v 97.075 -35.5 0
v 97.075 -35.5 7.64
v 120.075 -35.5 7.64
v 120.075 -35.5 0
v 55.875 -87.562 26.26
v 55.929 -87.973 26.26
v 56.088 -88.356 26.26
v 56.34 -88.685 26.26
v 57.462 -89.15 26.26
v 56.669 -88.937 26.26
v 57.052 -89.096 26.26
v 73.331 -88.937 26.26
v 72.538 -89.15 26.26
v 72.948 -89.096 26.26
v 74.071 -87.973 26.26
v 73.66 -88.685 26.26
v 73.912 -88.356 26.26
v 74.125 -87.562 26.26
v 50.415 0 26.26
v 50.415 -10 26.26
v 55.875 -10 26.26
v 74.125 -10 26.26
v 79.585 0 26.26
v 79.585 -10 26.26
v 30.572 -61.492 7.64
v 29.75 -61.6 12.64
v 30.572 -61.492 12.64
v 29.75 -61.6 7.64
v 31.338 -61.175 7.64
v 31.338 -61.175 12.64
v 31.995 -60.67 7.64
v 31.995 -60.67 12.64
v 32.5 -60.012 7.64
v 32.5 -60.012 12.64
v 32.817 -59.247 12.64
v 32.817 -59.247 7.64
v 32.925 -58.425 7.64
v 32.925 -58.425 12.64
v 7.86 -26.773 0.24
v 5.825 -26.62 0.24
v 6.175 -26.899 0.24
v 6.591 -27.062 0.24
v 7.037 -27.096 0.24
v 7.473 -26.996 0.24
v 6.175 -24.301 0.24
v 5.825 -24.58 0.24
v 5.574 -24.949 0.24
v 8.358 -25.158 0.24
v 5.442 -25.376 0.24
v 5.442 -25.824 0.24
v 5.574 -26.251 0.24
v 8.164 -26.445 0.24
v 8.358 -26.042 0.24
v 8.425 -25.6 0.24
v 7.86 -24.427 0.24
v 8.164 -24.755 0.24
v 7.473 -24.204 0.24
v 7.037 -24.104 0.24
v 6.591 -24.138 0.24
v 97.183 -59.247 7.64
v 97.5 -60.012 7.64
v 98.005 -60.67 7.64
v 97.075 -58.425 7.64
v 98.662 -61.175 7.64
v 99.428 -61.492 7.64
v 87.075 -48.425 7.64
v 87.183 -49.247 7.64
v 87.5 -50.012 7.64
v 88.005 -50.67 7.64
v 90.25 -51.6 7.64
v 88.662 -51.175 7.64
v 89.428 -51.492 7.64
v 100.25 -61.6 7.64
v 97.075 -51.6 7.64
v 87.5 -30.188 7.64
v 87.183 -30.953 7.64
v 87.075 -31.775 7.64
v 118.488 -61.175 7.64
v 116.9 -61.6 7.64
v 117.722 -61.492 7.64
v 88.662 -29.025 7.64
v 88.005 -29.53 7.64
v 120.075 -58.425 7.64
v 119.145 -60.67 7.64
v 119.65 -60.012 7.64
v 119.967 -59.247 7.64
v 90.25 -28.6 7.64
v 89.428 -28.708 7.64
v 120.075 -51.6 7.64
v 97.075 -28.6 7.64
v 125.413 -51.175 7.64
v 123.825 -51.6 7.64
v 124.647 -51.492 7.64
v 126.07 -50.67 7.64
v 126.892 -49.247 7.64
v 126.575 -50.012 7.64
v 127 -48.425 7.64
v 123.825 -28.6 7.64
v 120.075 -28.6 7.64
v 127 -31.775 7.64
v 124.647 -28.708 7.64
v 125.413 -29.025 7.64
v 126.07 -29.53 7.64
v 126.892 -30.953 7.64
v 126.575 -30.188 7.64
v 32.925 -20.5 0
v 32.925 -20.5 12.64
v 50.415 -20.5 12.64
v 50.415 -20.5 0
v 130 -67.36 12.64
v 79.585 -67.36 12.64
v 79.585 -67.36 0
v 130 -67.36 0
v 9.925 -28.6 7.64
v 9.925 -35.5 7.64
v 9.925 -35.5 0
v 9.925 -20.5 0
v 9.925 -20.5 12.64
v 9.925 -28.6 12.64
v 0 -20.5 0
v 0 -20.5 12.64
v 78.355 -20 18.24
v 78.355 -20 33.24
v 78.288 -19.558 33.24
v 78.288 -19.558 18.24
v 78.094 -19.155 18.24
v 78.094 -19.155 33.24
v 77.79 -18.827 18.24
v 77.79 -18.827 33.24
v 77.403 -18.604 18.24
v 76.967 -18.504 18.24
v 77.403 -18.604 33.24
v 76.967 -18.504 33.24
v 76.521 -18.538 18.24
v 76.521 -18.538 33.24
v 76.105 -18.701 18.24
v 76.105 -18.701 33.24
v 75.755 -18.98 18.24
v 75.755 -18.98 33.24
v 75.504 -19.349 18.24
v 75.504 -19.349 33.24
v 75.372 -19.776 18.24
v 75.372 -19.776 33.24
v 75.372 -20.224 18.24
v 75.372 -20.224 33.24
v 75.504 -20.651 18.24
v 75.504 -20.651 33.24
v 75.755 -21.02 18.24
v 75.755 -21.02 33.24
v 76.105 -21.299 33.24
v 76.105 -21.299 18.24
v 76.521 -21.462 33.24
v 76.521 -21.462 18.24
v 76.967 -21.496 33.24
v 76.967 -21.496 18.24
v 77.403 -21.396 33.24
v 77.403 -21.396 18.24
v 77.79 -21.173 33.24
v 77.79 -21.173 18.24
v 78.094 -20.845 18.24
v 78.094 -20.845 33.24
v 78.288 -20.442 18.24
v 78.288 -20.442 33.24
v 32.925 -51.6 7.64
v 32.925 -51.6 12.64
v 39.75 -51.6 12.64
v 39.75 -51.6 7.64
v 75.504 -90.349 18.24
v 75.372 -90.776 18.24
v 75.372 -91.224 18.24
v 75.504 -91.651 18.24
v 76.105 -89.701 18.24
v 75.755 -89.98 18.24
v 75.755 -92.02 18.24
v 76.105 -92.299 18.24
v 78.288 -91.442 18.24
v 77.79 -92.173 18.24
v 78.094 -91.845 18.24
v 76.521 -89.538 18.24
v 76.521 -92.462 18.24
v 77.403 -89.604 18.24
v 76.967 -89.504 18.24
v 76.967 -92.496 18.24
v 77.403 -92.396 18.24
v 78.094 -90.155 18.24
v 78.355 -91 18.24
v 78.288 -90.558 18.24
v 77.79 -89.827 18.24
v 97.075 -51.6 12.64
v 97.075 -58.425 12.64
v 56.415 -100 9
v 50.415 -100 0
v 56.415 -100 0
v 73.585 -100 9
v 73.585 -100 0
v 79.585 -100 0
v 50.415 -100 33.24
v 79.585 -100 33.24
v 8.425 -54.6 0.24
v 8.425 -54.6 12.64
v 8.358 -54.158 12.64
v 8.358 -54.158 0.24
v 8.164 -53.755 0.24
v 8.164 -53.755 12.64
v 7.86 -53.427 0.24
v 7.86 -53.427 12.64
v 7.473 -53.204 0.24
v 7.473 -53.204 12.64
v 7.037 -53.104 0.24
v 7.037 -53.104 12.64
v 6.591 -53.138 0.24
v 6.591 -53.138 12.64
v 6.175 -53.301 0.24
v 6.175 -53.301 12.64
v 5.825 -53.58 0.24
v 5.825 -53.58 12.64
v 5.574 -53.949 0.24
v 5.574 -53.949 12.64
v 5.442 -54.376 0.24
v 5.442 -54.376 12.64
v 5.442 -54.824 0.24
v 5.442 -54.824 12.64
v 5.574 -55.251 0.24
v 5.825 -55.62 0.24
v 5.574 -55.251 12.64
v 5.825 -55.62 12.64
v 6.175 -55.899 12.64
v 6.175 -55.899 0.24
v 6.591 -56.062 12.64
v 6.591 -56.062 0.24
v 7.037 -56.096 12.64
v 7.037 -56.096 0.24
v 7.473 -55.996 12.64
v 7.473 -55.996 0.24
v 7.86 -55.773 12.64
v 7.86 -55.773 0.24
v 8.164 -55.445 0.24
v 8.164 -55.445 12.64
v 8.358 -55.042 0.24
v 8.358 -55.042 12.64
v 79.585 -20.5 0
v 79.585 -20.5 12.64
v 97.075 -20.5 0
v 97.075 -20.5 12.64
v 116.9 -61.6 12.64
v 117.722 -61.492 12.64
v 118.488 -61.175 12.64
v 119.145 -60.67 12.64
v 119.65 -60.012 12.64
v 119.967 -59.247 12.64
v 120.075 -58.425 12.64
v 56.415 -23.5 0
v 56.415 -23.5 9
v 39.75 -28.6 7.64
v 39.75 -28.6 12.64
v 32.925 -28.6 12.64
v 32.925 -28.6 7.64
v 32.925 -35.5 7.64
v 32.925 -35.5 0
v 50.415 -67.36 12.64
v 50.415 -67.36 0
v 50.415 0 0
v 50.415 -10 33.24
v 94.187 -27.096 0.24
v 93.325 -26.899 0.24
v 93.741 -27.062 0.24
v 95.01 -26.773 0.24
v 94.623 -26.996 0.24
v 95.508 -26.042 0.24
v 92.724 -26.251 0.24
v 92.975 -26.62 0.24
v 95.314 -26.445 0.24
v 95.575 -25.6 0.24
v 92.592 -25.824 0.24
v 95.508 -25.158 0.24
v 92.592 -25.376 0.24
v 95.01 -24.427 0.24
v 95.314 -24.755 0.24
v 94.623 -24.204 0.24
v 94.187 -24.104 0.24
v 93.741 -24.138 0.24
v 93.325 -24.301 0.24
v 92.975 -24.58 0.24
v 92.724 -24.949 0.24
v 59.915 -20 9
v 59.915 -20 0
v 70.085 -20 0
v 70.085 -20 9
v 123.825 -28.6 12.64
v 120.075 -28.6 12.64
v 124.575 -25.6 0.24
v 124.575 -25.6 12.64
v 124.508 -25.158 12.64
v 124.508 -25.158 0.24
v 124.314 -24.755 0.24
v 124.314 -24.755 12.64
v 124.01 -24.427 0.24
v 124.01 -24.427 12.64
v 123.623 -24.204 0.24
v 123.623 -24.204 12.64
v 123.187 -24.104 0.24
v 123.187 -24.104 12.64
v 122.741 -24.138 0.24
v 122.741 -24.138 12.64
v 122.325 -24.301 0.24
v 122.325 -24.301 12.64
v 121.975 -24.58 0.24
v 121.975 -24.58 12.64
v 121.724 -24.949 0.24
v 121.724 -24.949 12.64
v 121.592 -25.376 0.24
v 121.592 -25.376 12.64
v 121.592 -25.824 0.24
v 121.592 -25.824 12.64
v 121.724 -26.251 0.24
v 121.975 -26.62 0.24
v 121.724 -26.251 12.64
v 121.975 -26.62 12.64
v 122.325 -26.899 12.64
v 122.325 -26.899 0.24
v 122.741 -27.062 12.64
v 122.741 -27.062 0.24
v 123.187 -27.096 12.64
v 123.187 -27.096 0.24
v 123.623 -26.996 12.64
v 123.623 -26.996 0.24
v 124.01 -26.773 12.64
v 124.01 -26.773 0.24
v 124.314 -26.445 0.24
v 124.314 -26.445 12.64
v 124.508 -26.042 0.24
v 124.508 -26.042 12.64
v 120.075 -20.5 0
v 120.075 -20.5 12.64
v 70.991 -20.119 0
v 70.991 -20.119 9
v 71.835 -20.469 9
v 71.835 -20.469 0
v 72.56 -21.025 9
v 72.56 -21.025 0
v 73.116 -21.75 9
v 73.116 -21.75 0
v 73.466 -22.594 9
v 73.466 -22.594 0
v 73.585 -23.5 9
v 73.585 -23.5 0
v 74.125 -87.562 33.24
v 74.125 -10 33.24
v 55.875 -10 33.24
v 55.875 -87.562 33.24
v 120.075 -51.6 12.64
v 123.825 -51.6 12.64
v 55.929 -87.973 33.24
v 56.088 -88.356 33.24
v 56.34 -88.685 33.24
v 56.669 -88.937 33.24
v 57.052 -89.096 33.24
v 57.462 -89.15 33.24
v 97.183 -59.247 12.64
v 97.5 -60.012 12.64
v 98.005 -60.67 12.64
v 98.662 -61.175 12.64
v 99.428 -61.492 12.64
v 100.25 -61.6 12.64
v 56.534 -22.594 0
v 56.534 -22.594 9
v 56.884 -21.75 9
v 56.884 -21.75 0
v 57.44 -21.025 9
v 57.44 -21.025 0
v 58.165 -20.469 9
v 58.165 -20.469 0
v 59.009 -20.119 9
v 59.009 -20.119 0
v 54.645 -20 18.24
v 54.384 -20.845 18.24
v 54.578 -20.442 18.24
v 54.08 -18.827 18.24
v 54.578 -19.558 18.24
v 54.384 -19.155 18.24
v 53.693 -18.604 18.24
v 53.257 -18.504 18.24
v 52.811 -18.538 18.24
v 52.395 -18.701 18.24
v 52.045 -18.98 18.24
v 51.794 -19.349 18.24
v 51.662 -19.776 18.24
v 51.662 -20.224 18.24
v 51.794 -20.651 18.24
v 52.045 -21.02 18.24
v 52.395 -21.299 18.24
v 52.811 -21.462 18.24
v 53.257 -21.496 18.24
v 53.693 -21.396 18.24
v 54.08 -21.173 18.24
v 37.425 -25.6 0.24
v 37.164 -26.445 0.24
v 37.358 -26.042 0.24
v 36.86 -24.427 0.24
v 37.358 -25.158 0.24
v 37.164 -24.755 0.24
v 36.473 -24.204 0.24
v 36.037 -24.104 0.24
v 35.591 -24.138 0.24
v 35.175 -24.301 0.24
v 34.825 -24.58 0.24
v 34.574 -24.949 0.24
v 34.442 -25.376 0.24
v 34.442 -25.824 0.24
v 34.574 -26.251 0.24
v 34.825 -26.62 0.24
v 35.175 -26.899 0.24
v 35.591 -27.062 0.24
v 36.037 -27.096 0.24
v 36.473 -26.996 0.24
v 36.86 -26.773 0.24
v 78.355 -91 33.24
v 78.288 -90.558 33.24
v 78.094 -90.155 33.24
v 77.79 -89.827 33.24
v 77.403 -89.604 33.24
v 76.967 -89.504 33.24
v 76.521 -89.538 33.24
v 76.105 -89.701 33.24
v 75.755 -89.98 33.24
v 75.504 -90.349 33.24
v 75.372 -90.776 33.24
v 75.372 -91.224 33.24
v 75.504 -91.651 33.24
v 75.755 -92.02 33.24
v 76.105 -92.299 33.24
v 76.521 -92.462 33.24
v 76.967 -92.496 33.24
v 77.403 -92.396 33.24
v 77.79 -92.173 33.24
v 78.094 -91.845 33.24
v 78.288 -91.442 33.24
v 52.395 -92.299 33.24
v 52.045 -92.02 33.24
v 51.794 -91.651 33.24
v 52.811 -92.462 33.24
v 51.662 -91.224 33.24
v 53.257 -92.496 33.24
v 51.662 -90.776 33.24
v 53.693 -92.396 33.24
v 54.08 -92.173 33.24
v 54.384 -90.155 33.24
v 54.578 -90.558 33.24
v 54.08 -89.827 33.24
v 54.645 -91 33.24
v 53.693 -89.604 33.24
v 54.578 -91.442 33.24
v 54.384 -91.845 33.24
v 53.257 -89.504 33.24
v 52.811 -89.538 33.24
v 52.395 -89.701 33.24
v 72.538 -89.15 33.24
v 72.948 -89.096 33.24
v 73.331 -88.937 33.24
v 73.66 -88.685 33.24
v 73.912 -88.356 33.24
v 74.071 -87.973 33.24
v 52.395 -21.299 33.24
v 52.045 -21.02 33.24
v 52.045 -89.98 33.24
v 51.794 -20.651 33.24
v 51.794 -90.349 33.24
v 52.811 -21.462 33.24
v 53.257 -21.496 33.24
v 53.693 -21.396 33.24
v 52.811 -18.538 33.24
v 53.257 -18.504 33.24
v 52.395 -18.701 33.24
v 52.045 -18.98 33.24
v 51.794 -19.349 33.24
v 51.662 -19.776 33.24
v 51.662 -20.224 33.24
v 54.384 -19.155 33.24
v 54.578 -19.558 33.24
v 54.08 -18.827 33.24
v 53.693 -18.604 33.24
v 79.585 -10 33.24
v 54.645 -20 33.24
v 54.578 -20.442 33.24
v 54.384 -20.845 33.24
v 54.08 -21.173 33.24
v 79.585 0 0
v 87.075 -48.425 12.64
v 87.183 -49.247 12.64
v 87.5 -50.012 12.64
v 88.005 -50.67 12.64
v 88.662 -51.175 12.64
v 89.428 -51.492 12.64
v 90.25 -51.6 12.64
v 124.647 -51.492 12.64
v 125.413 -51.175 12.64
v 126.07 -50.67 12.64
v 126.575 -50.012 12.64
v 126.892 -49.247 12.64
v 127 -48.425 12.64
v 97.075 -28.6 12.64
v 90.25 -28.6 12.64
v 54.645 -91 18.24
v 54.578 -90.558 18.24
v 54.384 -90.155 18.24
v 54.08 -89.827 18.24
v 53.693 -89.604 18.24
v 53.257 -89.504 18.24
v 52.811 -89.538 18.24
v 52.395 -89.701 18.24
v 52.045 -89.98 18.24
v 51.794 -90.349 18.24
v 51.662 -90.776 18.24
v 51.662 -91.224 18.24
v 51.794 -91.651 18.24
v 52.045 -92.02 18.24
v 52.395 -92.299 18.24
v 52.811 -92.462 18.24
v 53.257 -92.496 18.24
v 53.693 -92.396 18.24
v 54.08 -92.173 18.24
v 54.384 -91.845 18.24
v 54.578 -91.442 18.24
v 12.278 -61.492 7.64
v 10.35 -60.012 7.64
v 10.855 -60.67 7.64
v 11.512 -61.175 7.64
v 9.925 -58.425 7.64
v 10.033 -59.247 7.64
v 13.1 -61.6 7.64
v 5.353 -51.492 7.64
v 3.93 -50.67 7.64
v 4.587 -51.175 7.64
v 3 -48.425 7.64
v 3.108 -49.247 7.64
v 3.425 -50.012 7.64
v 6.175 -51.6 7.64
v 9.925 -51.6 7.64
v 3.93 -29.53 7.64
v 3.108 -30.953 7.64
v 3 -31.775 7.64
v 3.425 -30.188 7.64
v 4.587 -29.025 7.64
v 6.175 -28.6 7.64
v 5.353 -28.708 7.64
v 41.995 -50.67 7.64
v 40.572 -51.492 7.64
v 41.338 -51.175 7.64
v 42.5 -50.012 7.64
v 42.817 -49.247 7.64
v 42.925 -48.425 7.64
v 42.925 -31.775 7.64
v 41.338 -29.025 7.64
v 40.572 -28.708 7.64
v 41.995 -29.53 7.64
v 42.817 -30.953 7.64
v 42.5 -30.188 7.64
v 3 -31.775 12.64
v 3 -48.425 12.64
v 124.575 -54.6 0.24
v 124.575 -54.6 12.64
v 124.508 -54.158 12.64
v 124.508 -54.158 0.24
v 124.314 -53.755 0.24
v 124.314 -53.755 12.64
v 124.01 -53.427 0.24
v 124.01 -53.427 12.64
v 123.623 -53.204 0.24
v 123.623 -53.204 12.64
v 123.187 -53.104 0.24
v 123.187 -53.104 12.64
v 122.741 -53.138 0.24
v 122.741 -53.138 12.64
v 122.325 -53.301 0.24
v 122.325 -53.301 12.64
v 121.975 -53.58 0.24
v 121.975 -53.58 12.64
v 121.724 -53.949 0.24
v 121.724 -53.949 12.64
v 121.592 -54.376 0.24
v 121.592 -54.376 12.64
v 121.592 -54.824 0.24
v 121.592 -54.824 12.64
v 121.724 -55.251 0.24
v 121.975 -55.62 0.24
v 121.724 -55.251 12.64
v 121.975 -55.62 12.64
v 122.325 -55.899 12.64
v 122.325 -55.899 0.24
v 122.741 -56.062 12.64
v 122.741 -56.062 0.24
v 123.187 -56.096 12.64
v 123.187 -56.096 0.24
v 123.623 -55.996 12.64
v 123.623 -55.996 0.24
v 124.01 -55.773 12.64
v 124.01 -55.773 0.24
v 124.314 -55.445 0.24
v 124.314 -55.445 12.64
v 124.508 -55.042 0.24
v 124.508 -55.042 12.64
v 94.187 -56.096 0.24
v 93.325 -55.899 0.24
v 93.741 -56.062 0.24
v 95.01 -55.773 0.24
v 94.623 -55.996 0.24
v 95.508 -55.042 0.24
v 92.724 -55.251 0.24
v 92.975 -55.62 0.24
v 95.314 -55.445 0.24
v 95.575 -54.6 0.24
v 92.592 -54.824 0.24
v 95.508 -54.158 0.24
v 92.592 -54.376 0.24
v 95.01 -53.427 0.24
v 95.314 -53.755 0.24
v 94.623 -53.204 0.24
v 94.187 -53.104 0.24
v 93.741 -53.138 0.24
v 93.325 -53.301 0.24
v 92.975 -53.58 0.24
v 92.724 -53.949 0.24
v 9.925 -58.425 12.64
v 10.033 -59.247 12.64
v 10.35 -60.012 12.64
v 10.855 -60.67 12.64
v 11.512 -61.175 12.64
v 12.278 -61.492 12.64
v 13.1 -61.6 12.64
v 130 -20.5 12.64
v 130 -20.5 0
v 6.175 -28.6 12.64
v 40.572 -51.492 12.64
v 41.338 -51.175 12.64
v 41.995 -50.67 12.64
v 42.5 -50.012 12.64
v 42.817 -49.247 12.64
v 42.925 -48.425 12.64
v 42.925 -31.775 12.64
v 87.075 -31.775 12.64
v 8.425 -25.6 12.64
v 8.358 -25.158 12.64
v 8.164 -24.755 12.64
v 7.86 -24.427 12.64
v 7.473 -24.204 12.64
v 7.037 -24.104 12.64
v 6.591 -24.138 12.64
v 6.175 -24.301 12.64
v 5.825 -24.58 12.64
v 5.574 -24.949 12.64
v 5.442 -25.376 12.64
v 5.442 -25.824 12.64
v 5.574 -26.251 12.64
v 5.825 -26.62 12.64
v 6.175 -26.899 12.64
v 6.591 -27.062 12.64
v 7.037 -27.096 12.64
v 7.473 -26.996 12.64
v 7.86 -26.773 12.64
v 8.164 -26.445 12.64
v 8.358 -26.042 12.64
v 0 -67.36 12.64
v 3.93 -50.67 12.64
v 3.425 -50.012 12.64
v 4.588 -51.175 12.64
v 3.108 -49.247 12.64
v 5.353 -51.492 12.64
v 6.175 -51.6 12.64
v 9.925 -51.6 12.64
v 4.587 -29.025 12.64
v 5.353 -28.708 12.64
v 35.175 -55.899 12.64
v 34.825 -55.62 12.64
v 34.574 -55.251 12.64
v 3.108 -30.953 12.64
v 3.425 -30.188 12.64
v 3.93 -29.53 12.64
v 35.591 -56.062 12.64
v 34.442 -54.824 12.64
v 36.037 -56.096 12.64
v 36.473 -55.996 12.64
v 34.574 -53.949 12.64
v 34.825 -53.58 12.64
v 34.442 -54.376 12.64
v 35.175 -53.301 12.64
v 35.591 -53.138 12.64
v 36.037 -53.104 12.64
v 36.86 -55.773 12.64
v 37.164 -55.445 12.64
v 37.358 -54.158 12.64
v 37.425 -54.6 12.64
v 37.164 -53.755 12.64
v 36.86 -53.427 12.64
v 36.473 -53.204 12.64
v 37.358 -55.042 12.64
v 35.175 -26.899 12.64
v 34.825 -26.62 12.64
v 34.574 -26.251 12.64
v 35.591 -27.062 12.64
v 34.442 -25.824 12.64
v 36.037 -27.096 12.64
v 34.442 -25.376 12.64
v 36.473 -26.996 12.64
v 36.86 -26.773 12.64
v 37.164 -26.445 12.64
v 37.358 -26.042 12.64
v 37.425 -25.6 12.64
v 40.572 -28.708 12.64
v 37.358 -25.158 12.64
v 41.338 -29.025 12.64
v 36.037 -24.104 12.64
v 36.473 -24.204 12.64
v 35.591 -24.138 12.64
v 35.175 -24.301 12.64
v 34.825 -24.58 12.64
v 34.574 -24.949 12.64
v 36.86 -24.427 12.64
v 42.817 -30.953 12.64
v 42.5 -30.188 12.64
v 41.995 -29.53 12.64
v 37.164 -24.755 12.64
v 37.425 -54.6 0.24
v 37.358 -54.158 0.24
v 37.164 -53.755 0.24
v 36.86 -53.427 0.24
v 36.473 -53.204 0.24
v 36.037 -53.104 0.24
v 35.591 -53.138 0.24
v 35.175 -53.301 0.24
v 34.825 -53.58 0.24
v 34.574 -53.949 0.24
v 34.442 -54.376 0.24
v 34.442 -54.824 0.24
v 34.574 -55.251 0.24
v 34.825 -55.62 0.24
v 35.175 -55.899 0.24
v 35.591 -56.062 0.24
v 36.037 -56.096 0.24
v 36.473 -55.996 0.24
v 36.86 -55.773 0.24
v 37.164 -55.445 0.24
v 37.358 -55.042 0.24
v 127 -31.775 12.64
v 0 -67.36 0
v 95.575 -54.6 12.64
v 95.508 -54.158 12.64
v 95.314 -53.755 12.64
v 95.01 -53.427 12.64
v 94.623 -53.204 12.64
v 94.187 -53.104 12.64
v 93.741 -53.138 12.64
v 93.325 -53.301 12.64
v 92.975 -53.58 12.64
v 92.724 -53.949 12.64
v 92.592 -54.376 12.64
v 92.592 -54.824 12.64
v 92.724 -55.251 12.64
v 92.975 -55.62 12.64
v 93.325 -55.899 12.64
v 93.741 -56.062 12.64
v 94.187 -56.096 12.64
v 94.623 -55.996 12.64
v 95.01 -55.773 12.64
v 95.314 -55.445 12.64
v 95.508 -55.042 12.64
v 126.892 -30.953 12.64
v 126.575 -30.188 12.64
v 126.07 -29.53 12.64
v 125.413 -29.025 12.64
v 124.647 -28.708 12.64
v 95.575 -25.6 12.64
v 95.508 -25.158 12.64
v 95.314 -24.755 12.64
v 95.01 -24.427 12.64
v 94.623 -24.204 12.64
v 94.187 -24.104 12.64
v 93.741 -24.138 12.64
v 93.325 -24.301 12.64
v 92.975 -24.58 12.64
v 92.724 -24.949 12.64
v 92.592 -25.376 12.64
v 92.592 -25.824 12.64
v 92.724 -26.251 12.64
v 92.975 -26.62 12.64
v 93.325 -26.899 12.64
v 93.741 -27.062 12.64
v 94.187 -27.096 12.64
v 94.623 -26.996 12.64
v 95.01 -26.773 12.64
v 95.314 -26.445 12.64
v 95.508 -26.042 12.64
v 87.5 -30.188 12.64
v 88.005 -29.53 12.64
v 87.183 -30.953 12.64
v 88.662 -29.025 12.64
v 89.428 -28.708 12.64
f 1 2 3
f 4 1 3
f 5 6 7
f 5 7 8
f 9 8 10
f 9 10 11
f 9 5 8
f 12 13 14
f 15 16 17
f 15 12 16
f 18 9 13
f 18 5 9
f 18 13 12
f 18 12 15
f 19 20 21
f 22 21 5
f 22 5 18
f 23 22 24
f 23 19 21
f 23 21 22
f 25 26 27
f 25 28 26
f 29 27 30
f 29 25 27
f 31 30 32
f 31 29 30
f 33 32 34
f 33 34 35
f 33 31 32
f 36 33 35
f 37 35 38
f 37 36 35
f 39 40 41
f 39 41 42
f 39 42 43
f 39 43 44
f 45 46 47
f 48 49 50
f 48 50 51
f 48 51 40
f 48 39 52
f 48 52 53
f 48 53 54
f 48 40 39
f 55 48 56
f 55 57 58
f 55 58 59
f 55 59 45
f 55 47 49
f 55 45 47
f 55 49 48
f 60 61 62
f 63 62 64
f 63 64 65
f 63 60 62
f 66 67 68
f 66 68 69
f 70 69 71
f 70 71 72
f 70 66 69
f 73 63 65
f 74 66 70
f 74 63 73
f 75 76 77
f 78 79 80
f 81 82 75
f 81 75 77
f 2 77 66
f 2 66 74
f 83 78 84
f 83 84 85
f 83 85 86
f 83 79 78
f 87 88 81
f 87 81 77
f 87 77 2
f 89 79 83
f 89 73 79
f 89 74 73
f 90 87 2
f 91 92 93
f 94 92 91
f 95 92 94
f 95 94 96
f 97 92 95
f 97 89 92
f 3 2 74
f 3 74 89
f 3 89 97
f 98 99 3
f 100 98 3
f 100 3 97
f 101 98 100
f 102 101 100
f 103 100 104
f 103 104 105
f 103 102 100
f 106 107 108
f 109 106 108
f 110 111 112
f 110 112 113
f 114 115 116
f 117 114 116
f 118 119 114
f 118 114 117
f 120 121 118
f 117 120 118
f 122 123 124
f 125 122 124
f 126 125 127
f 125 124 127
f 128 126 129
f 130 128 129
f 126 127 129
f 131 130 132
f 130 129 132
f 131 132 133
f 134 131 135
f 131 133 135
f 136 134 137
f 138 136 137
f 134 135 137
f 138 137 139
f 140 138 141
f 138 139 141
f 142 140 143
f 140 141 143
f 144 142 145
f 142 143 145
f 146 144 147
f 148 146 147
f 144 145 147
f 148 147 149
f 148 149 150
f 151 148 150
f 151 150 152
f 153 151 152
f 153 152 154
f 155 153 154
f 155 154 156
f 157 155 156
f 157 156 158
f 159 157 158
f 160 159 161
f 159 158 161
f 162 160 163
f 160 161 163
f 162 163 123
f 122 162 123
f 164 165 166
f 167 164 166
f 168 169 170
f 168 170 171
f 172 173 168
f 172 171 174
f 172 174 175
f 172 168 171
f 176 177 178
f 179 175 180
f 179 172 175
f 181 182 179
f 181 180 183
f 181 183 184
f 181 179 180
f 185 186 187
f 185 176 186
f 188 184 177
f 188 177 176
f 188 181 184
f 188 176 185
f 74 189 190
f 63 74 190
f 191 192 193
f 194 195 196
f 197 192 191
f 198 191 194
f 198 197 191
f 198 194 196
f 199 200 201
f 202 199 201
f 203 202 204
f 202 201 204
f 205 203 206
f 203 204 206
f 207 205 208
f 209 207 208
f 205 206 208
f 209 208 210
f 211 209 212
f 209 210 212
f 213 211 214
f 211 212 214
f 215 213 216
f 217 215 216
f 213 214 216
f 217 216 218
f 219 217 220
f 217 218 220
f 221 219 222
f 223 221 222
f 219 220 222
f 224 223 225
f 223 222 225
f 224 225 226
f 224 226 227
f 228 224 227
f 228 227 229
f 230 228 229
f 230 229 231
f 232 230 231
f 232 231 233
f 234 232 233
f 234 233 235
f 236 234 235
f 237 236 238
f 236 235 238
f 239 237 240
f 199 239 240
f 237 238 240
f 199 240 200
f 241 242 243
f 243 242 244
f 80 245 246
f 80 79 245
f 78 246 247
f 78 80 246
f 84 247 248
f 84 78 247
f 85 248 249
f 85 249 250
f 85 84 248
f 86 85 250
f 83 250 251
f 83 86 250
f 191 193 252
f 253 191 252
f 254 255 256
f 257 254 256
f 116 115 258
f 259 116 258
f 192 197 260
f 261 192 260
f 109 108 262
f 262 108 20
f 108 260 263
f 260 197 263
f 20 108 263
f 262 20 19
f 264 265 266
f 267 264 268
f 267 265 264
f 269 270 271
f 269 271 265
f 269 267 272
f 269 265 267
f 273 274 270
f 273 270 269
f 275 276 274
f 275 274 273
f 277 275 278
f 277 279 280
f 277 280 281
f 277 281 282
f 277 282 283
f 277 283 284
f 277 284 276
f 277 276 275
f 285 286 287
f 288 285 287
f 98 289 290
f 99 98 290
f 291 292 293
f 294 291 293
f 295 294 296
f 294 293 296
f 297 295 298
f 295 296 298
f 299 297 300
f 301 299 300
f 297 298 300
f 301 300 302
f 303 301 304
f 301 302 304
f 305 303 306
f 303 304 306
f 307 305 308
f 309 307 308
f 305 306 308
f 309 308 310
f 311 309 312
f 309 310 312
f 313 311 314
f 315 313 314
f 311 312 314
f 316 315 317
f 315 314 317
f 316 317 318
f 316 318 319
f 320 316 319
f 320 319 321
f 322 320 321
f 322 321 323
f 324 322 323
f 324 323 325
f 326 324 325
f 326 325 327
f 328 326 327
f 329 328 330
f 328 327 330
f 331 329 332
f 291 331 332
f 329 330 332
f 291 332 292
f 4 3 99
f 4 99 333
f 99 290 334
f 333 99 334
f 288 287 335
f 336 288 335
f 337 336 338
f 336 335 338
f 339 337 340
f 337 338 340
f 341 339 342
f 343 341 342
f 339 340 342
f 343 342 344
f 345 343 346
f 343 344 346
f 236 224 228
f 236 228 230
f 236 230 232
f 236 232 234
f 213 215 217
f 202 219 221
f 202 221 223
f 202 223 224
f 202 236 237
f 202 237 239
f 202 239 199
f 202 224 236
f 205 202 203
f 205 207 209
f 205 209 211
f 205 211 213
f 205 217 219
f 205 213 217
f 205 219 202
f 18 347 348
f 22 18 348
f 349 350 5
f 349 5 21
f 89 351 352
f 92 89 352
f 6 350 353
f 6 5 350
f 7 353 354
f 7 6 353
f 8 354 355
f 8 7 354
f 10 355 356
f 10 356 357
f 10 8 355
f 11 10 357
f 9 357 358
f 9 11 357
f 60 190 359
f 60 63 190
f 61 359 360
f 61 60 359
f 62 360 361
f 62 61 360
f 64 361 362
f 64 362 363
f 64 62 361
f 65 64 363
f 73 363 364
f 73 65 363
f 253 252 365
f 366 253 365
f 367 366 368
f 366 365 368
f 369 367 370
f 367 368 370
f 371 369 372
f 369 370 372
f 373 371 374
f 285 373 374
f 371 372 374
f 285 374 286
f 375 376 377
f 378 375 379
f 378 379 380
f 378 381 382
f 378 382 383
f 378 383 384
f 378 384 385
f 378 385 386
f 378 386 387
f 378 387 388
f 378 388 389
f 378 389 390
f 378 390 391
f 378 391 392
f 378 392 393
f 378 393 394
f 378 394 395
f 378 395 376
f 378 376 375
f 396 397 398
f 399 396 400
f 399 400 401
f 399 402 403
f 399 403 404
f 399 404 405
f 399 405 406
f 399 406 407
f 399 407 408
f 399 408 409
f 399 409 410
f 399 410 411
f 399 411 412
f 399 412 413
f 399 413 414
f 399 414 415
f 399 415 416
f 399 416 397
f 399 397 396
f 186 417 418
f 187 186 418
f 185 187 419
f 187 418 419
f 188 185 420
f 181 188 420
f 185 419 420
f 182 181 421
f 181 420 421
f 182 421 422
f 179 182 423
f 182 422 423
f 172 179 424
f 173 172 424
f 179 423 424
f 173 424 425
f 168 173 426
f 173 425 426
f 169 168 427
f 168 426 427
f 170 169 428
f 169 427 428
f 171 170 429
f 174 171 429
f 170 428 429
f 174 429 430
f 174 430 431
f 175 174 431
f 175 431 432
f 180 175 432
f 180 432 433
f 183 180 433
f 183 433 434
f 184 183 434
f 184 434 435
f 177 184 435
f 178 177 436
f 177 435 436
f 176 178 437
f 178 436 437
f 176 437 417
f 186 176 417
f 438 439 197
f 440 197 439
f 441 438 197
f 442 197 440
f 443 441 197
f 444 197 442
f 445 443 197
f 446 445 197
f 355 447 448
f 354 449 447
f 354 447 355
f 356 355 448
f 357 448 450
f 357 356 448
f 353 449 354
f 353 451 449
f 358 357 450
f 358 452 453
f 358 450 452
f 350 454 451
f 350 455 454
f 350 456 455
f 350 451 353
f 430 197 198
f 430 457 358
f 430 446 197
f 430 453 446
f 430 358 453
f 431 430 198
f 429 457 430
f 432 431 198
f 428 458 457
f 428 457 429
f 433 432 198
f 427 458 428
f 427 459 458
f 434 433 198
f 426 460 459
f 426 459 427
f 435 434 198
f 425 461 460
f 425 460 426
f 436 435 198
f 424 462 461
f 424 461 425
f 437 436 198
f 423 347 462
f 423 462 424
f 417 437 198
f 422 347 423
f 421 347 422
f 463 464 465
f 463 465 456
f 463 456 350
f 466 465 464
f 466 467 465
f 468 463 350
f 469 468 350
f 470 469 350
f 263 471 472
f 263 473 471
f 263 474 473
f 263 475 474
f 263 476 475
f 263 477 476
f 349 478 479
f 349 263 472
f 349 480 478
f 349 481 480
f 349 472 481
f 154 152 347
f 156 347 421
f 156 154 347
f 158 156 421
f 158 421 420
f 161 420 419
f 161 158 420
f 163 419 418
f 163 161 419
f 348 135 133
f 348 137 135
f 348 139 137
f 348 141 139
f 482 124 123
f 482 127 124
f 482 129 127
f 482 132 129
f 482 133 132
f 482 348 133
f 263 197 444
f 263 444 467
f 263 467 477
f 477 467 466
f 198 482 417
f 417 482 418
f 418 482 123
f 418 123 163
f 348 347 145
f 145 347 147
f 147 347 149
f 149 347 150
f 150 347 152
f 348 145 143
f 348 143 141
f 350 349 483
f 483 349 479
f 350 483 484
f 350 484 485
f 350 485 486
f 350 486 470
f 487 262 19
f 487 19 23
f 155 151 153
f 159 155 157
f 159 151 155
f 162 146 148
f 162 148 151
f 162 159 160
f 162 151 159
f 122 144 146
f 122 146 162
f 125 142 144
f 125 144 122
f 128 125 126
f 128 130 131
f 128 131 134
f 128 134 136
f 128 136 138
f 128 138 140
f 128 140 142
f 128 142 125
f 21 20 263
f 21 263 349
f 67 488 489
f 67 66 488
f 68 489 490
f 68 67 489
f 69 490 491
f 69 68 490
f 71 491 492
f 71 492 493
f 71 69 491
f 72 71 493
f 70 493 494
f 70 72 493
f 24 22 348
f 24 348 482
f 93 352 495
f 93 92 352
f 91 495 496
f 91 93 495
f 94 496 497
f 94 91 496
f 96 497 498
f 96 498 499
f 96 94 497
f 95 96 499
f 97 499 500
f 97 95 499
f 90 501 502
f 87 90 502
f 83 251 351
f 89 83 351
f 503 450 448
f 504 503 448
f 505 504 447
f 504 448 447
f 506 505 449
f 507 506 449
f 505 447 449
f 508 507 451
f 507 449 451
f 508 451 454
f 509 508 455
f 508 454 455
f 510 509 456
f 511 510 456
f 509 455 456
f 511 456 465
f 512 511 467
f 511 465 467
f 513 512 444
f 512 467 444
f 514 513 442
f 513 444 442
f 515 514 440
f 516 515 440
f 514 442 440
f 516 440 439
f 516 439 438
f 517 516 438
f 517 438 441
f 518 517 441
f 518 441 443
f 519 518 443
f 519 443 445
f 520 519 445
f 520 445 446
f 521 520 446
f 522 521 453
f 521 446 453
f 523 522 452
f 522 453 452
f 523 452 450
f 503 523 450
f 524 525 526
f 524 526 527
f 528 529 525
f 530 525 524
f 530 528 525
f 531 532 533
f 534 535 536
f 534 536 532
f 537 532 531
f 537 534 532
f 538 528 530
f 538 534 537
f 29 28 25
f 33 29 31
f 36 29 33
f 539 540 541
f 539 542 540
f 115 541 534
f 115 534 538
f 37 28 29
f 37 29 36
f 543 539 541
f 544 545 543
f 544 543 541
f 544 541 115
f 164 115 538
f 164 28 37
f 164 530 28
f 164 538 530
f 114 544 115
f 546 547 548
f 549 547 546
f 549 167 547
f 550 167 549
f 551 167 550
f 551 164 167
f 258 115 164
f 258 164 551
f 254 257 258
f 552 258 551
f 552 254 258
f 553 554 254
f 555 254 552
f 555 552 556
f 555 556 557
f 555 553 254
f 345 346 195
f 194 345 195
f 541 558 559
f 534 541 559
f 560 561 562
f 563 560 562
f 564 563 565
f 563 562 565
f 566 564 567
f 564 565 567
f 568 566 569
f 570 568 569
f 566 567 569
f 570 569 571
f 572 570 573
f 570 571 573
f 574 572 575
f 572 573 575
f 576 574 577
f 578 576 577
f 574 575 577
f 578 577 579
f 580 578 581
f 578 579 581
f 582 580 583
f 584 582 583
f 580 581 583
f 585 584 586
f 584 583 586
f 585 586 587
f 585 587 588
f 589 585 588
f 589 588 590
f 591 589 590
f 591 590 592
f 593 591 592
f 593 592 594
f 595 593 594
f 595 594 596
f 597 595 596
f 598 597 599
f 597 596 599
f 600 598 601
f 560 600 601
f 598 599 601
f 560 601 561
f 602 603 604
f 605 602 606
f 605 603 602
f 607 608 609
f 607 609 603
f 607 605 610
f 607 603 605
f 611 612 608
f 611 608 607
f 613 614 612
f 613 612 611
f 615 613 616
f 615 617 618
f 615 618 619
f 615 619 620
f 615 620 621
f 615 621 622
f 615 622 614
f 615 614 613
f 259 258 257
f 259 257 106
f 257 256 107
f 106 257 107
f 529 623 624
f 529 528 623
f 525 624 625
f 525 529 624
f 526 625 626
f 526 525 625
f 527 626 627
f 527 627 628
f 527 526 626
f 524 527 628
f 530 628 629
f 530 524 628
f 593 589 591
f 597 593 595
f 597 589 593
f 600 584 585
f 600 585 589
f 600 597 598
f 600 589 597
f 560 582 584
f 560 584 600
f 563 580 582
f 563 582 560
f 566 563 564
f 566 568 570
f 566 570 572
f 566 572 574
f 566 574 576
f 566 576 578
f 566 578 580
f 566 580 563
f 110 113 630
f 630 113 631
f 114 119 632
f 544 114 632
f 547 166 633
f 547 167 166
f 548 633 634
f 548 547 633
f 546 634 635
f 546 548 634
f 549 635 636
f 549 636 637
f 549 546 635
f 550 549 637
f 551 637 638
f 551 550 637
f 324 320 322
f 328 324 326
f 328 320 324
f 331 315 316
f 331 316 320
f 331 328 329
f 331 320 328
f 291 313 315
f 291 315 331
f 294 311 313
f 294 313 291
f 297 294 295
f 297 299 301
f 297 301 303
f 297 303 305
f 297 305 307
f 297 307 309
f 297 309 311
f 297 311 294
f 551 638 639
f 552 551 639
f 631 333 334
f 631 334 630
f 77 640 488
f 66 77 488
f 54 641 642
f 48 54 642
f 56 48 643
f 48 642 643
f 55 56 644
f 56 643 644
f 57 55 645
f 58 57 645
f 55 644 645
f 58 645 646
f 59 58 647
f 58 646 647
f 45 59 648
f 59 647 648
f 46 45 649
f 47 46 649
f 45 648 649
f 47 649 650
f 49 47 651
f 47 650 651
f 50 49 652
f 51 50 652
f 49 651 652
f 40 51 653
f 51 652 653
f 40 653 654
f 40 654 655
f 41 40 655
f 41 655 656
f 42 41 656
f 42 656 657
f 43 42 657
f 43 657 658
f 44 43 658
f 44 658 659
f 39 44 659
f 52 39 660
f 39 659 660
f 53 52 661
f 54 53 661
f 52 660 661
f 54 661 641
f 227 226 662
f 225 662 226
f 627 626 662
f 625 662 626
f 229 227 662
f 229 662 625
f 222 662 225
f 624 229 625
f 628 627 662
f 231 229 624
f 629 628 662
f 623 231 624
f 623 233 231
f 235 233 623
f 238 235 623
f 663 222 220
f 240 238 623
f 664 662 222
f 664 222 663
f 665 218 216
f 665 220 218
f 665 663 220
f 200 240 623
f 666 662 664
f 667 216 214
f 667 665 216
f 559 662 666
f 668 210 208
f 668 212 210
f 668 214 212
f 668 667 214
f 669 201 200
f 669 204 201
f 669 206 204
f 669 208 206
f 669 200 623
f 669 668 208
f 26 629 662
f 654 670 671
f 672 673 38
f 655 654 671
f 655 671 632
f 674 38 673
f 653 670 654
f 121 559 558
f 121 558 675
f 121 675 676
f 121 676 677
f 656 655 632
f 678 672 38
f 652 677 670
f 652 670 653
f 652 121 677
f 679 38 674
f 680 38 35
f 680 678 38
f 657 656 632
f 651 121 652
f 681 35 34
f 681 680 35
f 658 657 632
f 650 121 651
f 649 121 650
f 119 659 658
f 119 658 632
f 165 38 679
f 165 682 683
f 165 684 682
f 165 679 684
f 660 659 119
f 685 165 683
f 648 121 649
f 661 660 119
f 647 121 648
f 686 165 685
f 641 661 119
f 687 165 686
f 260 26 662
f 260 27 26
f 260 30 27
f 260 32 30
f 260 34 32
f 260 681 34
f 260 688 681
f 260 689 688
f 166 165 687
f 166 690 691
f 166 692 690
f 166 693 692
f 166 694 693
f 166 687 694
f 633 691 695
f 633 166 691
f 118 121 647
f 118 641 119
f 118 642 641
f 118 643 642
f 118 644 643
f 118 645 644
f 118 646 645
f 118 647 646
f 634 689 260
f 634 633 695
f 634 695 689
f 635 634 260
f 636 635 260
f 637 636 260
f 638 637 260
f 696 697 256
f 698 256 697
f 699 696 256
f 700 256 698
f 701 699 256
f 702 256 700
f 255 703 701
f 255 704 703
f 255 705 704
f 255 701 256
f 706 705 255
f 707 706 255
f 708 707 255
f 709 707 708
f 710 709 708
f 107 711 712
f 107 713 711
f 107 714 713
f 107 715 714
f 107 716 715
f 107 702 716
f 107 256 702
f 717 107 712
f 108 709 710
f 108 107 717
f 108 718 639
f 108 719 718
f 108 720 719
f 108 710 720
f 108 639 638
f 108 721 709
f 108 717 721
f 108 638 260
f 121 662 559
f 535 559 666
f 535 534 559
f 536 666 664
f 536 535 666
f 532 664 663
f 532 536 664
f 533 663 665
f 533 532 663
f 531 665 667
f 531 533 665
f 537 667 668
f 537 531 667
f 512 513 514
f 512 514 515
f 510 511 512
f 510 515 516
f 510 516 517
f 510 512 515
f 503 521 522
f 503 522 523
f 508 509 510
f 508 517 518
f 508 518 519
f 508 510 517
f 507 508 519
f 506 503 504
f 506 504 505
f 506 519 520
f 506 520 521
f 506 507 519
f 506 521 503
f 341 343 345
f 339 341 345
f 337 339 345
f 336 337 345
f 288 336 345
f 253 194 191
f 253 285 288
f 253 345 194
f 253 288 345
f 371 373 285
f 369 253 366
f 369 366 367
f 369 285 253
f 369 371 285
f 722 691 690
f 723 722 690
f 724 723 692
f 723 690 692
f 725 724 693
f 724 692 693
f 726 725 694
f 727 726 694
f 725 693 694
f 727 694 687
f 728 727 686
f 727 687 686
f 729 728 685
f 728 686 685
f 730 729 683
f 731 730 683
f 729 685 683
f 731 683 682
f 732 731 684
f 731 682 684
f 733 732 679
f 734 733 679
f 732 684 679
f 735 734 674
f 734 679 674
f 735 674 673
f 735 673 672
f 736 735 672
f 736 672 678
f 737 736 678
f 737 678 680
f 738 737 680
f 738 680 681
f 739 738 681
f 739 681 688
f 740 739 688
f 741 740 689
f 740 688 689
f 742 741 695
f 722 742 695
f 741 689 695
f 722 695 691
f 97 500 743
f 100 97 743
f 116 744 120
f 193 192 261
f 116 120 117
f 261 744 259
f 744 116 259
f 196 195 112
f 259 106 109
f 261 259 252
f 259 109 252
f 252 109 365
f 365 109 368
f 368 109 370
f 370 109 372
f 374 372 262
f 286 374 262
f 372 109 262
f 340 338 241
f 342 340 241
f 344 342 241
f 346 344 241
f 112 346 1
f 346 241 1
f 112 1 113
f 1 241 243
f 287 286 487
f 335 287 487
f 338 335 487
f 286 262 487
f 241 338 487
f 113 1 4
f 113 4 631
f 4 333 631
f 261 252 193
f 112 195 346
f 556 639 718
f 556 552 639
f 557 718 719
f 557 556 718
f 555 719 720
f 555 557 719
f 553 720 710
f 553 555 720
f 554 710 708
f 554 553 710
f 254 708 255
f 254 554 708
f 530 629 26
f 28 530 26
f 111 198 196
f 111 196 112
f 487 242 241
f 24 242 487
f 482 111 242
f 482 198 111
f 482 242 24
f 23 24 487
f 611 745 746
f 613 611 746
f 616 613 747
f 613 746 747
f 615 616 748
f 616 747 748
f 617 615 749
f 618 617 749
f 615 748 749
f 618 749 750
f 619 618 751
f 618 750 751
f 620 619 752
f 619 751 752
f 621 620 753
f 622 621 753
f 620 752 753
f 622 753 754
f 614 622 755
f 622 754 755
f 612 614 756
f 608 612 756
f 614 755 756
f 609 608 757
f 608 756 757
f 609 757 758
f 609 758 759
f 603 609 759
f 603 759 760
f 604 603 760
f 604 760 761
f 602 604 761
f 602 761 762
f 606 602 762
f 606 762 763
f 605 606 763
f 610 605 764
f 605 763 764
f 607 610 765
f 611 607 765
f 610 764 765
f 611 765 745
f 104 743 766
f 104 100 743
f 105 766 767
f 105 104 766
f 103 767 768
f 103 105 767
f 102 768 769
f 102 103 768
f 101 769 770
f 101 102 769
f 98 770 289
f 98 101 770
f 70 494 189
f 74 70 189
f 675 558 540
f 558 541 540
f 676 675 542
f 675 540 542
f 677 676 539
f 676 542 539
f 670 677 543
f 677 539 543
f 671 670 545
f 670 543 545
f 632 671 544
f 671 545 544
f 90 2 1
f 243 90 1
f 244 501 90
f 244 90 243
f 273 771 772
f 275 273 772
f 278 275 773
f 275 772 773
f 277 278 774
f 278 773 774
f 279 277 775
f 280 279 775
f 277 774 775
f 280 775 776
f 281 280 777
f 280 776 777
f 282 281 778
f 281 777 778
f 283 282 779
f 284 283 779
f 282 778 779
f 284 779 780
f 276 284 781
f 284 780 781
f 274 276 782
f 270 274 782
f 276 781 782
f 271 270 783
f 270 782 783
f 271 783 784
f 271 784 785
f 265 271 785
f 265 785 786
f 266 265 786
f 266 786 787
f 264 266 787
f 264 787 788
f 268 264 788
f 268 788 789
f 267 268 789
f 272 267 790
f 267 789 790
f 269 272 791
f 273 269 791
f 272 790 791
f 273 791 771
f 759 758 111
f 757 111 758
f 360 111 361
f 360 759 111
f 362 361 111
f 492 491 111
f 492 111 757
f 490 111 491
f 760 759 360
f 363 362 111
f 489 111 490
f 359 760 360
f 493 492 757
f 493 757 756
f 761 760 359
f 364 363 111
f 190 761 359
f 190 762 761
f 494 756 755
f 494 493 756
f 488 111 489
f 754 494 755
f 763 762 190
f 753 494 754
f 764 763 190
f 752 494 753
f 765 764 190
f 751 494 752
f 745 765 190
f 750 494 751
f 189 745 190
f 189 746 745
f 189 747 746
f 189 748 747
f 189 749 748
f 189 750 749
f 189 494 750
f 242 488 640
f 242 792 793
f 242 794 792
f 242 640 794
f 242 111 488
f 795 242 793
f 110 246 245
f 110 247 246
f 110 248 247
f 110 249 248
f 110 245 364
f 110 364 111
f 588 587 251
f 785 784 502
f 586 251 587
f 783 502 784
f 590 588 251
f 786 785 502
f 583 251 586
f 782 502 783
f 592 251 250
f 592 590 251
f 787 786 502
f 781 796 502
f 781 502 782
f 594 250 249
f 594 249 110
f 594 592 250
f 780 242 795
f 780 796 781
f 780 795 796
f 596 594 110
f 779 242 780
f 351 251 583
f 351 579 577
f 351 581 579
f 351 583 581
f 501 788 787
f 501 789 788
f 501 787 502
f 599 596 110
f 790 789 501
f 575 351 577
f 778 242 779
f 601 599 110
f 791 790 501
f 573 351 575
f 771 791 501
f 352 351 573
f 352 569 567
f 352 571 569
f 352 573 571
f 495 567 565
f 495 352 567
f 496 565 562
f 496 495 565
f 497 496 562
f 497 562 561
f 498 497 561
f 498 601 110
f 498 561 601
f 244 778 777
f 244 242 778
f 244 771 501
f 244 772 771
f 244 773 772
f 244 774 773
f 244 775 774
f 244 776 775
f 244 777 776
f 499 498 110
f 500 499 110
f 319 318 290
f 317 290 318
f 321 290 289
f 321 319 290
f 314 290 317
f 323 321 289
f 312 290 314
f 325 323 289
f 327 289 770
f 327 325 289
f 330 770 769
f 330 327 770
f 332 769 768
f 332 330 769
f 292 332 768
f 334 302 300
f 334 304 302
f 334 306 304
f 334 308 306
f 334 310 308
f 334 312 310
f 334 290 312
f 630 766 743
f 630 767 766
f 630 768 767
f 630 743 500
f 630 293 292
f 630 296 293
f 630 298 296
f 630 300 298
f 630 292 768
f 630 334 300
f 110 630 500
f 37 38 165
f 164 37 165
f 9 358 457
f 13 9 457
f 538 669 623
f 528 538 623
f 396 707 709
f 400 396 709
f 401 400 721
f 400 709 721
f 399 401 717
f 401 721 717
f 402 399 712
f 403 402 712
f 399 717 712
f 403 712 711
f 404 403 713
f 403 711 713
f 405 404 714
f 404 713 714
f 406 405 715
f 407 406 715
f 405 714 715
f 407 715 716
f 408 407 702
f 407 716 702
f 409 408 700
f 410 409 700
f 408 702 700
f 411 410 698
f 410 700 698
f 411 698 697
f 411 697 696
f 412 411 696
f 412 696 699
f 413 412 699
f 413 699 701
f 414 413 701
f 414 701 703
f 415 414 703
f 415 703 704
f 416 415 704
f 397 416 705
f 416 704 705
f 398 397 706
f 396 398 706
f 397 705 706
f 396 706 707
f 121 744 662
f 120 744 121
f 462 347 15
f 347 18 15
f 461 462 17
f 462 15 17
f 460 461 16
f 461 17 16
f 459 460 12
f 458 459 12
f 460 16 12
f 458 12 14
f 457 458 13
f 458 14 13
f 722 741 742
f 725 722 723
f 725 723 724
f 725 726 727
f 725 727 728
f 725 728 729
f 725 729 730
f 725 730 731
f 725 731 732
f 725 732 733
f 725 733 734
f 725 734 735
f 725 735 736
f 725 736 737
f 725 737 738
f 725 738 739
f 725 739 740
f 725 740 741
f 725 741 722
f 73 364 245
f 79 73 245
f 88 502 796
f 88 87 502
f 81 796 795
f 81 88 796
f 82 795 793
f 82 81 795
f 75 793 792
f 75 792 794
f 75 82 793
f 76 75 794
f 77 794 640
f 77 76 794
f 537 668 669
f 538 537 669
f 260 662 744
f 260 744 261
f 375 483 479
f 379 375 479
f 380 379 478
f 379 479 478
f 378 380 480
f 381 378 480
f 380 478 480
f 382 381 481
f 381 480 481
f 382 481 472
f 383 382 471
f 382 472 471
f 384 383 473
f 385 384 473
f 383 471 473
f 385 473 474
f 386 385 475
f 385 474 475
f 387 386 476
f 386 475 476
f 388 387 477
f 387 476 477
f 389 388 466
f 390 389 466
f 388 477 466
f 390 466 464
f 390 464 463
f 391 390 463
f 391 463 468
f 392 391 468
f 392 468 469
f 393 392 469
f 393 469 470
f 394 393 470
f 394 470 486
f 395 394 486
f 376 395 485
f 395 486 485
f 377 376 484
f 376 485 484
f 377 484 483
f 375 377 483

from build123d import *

# Parameters (mm, degrees)
SKETCH1_W           = 130
SKETCH1_H           = 104.86
BOSS_EXTRUDE1_DEPTH = 39.84
SKETCH2_W           = 130
SKETCH2_H           = 94.86
CUT_EXTRUDE1_DEPTH  = 6.6
SKETCH3_W           = 18.25
SKETCH3_H           = 89.15
CUT_EXTRUDE2_DEPTH  = 6.98
SKETCH5_W           = 50.415
SKETCH5_H           = 94.86
CUT_EXTRUDE3_DEPTH  = 20.6
SKETCH6_R           = 1.5
CUT_EXTRUDE4_DEPTH  = 12.4
SKETCH7_W           = 50.415
SKETCH7_H           = 20.5
CUT_EXTRUDE5_DEPTH  = 12.4
SKETCH9_W           = 23
SKETCH9_H           = 15
CUT_EXTRUDE7_DEPTH  = 12.4
CUT_EXTRUDE8_DEPTH  = 5
SKETCH11_R          = 1.5
CUT_EXTRUDE9_DEPTH  = 15
FILLET2_R           = 3.175
FILLET3_R           = 3.175
FILLET4_R           = 3.175
FILLET5_R           = 1.5875
FILLET6_R           = 3.175
SKETCH12_W          = 50.415
SKETCH12_H          = 20.5
SKETCH12_W_2        = 23
SKETCH12_H_2        = 15
SKETCH12_H_3        = 27.5
SKETCH12_W_3        = 29.17
SKETCH12_H_4        = 4.86
CUT_EXTRUDE11_DEPTH = 42
SKETCH13_W          = 6.6
SKETCH13_H          = 5.14
CUT_EXTRUDE12_DEPTH = 80.585
SKETCH14_W          = 29.17
SKETCH14_H          = 10
CUT_EXTRUDE14_DEPTH = 6.98
CUT_EXTRUDE15_DEPTH = 9


with BuildPart() as part:
    # Sketch1 → Boss-Extrude1 (new body)
    with BuildSketch(Plane.XY):
        with Locations((65, -52.43)):
            Rectangle(SKETCH1_W, SKETCH1_H)
    extrude(amount=BOSS_EXTRUDE1_DEPTH)

    # Sketch2 → Cut-Extrude1 (cut)
    with BuildSketch(Plane.XY.offset(39.84)):
        with Locations((65, -47.43)):
            Rectangle(SKETCH2_W, SKETCH2_H)
    extrude(amount=-CUT_EXTRUDE1_DEPTH, mode=Mode.SUBTRACT)

    # Sketch3 → Cut-Extrude2 (cut)
    with BuildSketch(Plane.XY.offset(33.24)):
        with Locations((65, -44.575)):
            Rectangle(SKETCH3_W, SKETCH3_H)
    extrude(amount=-CUT_EXTRUDE2_DEPTH, mode=Mode.SUBTRACT)

    # Sketch5 → Cut-Extrude3 (cut)
    with BuildSketch(Plane.XY.offset(33.24)):
        with Locations((104.7925, -47.43)):
            Rectangle(SKETCH5_W, SKETCH5_H)
        with Locations((25.2075, -47.43)):
            Rectangle(SKETCH5_W, SKETCH5_H)
    extrude(amount=-CUT_EXTRUDE3_DEPTH, mode=Mode.SUBTRACT)

    # Sketch6 → Cut-Extrude4 (cut)
    with BuildSketch(Plane.XY.offset(12.64)):
        with Locations((35.925, -25.6)):
            Circle(SKETCH6_R)
        with Locations((6.925, -25.6)):
            Circle(SKETCH6_R)
        with Locations((35.925, -54.6)):
            Circle(SKETCH6_R)
        with Locations((6.925, -54.6)):
            Circle(SKETCH6_R)
        with Locations((94.075, -25.6)):
            Circle(SKETCH6_R)
        with Locations((123.075, -25.6)):
            Circle(SKETCH6_R)
        with Locations((94.075, -54.6)):
            Circle(SKETCH6_R)
        with Locations((123.075, -54.6)):
            Circle(SKETCH6_R)
    extrude(amount=-CUT_EXTRUDE4_DEPTH, mode=Mode.SUBTRACT)

    # Sketch7 → Cut-Extrude5 (cut)
    with BuildSketch(Plane.XY.offset(12.64)):
        with Locations((25.2075, -10.25)):
            Rectangle(SKETCH7_W, SKETCH7_H)
        with Locations((104.7925, -10.25)):
            Rectangle(SKETCH7_W, SKETCH7_H)
    extrude(amount=-CUT_EXTRUDE5_DEPTH, mode=Mode.SUBTRACT)

    # Sketch9 → Cut-Extrude7 (cut)
    with BuildSketch(Plane.XY.offset(12.64)):
        with Locations((108.575, -28)):
            Rectangle(SKETCH9_W, SKETCH9_H)
        with Locations((21.425, -28)):
            Rectangle(SKETCH9_W, SKETCH9_H)
    extrude(amount=-CUT_EXTRUDE7_DEPTH, mode=Mode.SUBTRACT)

    # Sketch10 → Cut-Extrude8 (cut)
    with BuildSketch(Plane.XY.offset(12.64)):
        Polygon((9.925, -28.6), (3, -28.6), (3, -51.6), (9.925, -51.6), (9.925, -61.6), (32.925, -61.6), (32.925, -51.6), (42.925, -51.6), (42.925, -28.6), (32.925, -28.6), (32.925, -35.5), (9.925, -35.5), align=None)
        Polygon((97.075, -28.6), (87.075, -28.6), (87.075, -51.6), (97.075, -51.6), (97.075, -61.6), (120.075, -61.6), (120.075, -51.6), (127, -51.6), (127, -28.6), (120.075, -28.6), (120.075, -35.5), (97.075, -35.5), align=None)
    extrude(amount=-CUT_EXTRUDE8_DEPTH, mode=Mode.SUBTRACT)

    # Sketch11 → Cut-Extrude9 (cut)
    with BuildSketch(Plane.XY.offset(33.24)):
        with Locations((53.145, -20)):
            Circle(SKETCH11_R)
        with Locations((76.855, -20)):
            Circle(SKETCH11_R)
        with Locations((53.145, -91)):
            Circle(SKETCH11_R)
        with Locations((76.855, -91)):
            Circle(SKETCH11_R)
    extrude(amount=-CUT_EXTRUDE9_DEPTH, mode=Mode.SUBTRACT)

    # Fillet2
    fillet2_edges = [part.edges().sort_by_distance(p)[0] for p in [
        (3, -51.6, 10.14),
    ]]
    fillet(fillet2_edges, radius=FILLET2_R)

    # Fillet3
    fillet3_edges = [part.edges().sort_by_distance(p)[0] for p in [
        (50.415, -20.5, 6.44),
        (79.585, -20.5, 6.44),
        (32.925, -35.5, 3.94),
        (9.925, -35.5, 3.94),
        (42.925, -28.6, 10.14),
        (42.925, -51.6, 10.14),
        (32.925, -61.6, 10.14),
        (9.925, -61.6, 10.14),
        (3, -28.6, 10.14),
        (127, -28.6, 10.14),
        (127, -51.6, 10.14),
        (120.075, -61.6, 10.14),
        (97.075, -61.6, 10.14),
        (87.075, -51.6, 10.14),
        (87.075, -28.6, 10.14),
    ]]
    fillet(fillet3_edges, radius=FILLET3_R)

    # Fillet4
    fillet4_edges = [part.edges().sort_by_distance(p)[0] for p in [
        (120.075, -35.5, 3.94),
        (97.075, -35.5, 3.94),
    ]]
    fillet(fillet4_edges, radius=FILLET4_R)

    # Fillet5
    fillet5_edges = [part.edges().sort_by_distance(p)[0] for p in [
        (74.125, -89.15, 29.75),
        (55.875, -89.15, 29.75),
    ]]
    fillet(fillet5_edges, radius=FILLET5_R)

    # Fillet6
    fillet6_edges = [part.edges().sort_by_distance(p)[0] for p in [
        (79.585, -94.86, 22.94),
        (50.415, -94.86, 22.94),
    ]]
    fillet(fillet6_edges, radius=FILLET6_R)

    # Sketch12 → Cut-Extrude11 (cut)
    with BuildSketch(Plane.XY.offset(39.84)):
        with Locations((25.2075, -10.25)):
            Rectangle(SKETCH12_W, SKETCH12_H)
        with Locations((104.7925, -10.25)):
            Rectangle(SKETCH12_W, SKETCH12_H)
        with Locations((108.575, -28)):
            Rectangle(SKETCH12_W_2, SKETCH12_H_2)
        with Locations((21.425, -28)):
            Rectangle(SKETCH12_W_2, SKETCH12_H_2)
        with Locations((25.2075, -81.11)):
            Rectangle(SKETCH12_W, SKETCH12_H_3)
        with Locations((104.7925, -81.11)):
            Rectangle(SKETCH12_W, SKETCH12_H_3)
        Polygon((130, -94.86), (79.585, -94.86), (79.585, -100), (79.585, -104.86), (130, -104.86), align=None)
        Polygon((50.415, -94.86), (0, -94.86), (0, -104.86), (50.415, -104.86), (50.415, -100), (50.415, -95.14), align=None)
        with Locations((65, -102.43)):
            Rectangle(SKETCH12_W_3, SKETCH12_H_4)
    extrude(amount=-CUT_EXTRUDE11_DEPTH, mode=Mode.SUBTRACT)

    # Sketch13 → Cut-Extrude12 (cut, through all)
    with BuildSketch(Plane(origin=(79.585, 0, 0), x_dir=(0, 0, -1), z_dir=(1, 0, 0))):
        with Locations((-36.54, -97.43)):
            Rectangle(SKETCH13_W, SKETCH13_H)
    extrude(amount=-CUT_EXTRUDE12_DEPTH, mode=Mode.SUBTRACT)

    # Sketch14 → Cut-Extrude14 (cut)
    with BuildSketch(Plane.XY.offset(33.24)):
        with Locations((65, -5)):
            Rectangle(SKETCH14_W, SKETCH14_H)
    extrude(amount=-CUT_EXTRUDE14_DEPTH, mode=Mode.SUBTRACT)

    # Sketch15 → Cut-Extrude15 (cut)
    with BuildSketch(Plane(origin=(0, 0, 0), x_dir=(-1, 0, 0), z_dir=(0, 0, -1))):
        with BuildLine():
            Line((-73.585, -100), (-56.415, -100))
            Line((-56.415, -100), (-56.415, -23.5))
            ThreePointArc((-56.415, -23.5), (-57.440126266, -21.025126266), (-59.915, -20))
            Line((-59.915, -20), (-70.085, -20))
            ThreePointArc((-70.085, -20), (-72.559873734, -21.025126266), (-73.585, -23.5))
            Line((-73.585, -23.5), (-73.585, -100))
        make_face()
    extrude(amount=-CUT_EXTRUDE15_DEPTH, mode=Mode.SUBTRACT)


solid = part.part
